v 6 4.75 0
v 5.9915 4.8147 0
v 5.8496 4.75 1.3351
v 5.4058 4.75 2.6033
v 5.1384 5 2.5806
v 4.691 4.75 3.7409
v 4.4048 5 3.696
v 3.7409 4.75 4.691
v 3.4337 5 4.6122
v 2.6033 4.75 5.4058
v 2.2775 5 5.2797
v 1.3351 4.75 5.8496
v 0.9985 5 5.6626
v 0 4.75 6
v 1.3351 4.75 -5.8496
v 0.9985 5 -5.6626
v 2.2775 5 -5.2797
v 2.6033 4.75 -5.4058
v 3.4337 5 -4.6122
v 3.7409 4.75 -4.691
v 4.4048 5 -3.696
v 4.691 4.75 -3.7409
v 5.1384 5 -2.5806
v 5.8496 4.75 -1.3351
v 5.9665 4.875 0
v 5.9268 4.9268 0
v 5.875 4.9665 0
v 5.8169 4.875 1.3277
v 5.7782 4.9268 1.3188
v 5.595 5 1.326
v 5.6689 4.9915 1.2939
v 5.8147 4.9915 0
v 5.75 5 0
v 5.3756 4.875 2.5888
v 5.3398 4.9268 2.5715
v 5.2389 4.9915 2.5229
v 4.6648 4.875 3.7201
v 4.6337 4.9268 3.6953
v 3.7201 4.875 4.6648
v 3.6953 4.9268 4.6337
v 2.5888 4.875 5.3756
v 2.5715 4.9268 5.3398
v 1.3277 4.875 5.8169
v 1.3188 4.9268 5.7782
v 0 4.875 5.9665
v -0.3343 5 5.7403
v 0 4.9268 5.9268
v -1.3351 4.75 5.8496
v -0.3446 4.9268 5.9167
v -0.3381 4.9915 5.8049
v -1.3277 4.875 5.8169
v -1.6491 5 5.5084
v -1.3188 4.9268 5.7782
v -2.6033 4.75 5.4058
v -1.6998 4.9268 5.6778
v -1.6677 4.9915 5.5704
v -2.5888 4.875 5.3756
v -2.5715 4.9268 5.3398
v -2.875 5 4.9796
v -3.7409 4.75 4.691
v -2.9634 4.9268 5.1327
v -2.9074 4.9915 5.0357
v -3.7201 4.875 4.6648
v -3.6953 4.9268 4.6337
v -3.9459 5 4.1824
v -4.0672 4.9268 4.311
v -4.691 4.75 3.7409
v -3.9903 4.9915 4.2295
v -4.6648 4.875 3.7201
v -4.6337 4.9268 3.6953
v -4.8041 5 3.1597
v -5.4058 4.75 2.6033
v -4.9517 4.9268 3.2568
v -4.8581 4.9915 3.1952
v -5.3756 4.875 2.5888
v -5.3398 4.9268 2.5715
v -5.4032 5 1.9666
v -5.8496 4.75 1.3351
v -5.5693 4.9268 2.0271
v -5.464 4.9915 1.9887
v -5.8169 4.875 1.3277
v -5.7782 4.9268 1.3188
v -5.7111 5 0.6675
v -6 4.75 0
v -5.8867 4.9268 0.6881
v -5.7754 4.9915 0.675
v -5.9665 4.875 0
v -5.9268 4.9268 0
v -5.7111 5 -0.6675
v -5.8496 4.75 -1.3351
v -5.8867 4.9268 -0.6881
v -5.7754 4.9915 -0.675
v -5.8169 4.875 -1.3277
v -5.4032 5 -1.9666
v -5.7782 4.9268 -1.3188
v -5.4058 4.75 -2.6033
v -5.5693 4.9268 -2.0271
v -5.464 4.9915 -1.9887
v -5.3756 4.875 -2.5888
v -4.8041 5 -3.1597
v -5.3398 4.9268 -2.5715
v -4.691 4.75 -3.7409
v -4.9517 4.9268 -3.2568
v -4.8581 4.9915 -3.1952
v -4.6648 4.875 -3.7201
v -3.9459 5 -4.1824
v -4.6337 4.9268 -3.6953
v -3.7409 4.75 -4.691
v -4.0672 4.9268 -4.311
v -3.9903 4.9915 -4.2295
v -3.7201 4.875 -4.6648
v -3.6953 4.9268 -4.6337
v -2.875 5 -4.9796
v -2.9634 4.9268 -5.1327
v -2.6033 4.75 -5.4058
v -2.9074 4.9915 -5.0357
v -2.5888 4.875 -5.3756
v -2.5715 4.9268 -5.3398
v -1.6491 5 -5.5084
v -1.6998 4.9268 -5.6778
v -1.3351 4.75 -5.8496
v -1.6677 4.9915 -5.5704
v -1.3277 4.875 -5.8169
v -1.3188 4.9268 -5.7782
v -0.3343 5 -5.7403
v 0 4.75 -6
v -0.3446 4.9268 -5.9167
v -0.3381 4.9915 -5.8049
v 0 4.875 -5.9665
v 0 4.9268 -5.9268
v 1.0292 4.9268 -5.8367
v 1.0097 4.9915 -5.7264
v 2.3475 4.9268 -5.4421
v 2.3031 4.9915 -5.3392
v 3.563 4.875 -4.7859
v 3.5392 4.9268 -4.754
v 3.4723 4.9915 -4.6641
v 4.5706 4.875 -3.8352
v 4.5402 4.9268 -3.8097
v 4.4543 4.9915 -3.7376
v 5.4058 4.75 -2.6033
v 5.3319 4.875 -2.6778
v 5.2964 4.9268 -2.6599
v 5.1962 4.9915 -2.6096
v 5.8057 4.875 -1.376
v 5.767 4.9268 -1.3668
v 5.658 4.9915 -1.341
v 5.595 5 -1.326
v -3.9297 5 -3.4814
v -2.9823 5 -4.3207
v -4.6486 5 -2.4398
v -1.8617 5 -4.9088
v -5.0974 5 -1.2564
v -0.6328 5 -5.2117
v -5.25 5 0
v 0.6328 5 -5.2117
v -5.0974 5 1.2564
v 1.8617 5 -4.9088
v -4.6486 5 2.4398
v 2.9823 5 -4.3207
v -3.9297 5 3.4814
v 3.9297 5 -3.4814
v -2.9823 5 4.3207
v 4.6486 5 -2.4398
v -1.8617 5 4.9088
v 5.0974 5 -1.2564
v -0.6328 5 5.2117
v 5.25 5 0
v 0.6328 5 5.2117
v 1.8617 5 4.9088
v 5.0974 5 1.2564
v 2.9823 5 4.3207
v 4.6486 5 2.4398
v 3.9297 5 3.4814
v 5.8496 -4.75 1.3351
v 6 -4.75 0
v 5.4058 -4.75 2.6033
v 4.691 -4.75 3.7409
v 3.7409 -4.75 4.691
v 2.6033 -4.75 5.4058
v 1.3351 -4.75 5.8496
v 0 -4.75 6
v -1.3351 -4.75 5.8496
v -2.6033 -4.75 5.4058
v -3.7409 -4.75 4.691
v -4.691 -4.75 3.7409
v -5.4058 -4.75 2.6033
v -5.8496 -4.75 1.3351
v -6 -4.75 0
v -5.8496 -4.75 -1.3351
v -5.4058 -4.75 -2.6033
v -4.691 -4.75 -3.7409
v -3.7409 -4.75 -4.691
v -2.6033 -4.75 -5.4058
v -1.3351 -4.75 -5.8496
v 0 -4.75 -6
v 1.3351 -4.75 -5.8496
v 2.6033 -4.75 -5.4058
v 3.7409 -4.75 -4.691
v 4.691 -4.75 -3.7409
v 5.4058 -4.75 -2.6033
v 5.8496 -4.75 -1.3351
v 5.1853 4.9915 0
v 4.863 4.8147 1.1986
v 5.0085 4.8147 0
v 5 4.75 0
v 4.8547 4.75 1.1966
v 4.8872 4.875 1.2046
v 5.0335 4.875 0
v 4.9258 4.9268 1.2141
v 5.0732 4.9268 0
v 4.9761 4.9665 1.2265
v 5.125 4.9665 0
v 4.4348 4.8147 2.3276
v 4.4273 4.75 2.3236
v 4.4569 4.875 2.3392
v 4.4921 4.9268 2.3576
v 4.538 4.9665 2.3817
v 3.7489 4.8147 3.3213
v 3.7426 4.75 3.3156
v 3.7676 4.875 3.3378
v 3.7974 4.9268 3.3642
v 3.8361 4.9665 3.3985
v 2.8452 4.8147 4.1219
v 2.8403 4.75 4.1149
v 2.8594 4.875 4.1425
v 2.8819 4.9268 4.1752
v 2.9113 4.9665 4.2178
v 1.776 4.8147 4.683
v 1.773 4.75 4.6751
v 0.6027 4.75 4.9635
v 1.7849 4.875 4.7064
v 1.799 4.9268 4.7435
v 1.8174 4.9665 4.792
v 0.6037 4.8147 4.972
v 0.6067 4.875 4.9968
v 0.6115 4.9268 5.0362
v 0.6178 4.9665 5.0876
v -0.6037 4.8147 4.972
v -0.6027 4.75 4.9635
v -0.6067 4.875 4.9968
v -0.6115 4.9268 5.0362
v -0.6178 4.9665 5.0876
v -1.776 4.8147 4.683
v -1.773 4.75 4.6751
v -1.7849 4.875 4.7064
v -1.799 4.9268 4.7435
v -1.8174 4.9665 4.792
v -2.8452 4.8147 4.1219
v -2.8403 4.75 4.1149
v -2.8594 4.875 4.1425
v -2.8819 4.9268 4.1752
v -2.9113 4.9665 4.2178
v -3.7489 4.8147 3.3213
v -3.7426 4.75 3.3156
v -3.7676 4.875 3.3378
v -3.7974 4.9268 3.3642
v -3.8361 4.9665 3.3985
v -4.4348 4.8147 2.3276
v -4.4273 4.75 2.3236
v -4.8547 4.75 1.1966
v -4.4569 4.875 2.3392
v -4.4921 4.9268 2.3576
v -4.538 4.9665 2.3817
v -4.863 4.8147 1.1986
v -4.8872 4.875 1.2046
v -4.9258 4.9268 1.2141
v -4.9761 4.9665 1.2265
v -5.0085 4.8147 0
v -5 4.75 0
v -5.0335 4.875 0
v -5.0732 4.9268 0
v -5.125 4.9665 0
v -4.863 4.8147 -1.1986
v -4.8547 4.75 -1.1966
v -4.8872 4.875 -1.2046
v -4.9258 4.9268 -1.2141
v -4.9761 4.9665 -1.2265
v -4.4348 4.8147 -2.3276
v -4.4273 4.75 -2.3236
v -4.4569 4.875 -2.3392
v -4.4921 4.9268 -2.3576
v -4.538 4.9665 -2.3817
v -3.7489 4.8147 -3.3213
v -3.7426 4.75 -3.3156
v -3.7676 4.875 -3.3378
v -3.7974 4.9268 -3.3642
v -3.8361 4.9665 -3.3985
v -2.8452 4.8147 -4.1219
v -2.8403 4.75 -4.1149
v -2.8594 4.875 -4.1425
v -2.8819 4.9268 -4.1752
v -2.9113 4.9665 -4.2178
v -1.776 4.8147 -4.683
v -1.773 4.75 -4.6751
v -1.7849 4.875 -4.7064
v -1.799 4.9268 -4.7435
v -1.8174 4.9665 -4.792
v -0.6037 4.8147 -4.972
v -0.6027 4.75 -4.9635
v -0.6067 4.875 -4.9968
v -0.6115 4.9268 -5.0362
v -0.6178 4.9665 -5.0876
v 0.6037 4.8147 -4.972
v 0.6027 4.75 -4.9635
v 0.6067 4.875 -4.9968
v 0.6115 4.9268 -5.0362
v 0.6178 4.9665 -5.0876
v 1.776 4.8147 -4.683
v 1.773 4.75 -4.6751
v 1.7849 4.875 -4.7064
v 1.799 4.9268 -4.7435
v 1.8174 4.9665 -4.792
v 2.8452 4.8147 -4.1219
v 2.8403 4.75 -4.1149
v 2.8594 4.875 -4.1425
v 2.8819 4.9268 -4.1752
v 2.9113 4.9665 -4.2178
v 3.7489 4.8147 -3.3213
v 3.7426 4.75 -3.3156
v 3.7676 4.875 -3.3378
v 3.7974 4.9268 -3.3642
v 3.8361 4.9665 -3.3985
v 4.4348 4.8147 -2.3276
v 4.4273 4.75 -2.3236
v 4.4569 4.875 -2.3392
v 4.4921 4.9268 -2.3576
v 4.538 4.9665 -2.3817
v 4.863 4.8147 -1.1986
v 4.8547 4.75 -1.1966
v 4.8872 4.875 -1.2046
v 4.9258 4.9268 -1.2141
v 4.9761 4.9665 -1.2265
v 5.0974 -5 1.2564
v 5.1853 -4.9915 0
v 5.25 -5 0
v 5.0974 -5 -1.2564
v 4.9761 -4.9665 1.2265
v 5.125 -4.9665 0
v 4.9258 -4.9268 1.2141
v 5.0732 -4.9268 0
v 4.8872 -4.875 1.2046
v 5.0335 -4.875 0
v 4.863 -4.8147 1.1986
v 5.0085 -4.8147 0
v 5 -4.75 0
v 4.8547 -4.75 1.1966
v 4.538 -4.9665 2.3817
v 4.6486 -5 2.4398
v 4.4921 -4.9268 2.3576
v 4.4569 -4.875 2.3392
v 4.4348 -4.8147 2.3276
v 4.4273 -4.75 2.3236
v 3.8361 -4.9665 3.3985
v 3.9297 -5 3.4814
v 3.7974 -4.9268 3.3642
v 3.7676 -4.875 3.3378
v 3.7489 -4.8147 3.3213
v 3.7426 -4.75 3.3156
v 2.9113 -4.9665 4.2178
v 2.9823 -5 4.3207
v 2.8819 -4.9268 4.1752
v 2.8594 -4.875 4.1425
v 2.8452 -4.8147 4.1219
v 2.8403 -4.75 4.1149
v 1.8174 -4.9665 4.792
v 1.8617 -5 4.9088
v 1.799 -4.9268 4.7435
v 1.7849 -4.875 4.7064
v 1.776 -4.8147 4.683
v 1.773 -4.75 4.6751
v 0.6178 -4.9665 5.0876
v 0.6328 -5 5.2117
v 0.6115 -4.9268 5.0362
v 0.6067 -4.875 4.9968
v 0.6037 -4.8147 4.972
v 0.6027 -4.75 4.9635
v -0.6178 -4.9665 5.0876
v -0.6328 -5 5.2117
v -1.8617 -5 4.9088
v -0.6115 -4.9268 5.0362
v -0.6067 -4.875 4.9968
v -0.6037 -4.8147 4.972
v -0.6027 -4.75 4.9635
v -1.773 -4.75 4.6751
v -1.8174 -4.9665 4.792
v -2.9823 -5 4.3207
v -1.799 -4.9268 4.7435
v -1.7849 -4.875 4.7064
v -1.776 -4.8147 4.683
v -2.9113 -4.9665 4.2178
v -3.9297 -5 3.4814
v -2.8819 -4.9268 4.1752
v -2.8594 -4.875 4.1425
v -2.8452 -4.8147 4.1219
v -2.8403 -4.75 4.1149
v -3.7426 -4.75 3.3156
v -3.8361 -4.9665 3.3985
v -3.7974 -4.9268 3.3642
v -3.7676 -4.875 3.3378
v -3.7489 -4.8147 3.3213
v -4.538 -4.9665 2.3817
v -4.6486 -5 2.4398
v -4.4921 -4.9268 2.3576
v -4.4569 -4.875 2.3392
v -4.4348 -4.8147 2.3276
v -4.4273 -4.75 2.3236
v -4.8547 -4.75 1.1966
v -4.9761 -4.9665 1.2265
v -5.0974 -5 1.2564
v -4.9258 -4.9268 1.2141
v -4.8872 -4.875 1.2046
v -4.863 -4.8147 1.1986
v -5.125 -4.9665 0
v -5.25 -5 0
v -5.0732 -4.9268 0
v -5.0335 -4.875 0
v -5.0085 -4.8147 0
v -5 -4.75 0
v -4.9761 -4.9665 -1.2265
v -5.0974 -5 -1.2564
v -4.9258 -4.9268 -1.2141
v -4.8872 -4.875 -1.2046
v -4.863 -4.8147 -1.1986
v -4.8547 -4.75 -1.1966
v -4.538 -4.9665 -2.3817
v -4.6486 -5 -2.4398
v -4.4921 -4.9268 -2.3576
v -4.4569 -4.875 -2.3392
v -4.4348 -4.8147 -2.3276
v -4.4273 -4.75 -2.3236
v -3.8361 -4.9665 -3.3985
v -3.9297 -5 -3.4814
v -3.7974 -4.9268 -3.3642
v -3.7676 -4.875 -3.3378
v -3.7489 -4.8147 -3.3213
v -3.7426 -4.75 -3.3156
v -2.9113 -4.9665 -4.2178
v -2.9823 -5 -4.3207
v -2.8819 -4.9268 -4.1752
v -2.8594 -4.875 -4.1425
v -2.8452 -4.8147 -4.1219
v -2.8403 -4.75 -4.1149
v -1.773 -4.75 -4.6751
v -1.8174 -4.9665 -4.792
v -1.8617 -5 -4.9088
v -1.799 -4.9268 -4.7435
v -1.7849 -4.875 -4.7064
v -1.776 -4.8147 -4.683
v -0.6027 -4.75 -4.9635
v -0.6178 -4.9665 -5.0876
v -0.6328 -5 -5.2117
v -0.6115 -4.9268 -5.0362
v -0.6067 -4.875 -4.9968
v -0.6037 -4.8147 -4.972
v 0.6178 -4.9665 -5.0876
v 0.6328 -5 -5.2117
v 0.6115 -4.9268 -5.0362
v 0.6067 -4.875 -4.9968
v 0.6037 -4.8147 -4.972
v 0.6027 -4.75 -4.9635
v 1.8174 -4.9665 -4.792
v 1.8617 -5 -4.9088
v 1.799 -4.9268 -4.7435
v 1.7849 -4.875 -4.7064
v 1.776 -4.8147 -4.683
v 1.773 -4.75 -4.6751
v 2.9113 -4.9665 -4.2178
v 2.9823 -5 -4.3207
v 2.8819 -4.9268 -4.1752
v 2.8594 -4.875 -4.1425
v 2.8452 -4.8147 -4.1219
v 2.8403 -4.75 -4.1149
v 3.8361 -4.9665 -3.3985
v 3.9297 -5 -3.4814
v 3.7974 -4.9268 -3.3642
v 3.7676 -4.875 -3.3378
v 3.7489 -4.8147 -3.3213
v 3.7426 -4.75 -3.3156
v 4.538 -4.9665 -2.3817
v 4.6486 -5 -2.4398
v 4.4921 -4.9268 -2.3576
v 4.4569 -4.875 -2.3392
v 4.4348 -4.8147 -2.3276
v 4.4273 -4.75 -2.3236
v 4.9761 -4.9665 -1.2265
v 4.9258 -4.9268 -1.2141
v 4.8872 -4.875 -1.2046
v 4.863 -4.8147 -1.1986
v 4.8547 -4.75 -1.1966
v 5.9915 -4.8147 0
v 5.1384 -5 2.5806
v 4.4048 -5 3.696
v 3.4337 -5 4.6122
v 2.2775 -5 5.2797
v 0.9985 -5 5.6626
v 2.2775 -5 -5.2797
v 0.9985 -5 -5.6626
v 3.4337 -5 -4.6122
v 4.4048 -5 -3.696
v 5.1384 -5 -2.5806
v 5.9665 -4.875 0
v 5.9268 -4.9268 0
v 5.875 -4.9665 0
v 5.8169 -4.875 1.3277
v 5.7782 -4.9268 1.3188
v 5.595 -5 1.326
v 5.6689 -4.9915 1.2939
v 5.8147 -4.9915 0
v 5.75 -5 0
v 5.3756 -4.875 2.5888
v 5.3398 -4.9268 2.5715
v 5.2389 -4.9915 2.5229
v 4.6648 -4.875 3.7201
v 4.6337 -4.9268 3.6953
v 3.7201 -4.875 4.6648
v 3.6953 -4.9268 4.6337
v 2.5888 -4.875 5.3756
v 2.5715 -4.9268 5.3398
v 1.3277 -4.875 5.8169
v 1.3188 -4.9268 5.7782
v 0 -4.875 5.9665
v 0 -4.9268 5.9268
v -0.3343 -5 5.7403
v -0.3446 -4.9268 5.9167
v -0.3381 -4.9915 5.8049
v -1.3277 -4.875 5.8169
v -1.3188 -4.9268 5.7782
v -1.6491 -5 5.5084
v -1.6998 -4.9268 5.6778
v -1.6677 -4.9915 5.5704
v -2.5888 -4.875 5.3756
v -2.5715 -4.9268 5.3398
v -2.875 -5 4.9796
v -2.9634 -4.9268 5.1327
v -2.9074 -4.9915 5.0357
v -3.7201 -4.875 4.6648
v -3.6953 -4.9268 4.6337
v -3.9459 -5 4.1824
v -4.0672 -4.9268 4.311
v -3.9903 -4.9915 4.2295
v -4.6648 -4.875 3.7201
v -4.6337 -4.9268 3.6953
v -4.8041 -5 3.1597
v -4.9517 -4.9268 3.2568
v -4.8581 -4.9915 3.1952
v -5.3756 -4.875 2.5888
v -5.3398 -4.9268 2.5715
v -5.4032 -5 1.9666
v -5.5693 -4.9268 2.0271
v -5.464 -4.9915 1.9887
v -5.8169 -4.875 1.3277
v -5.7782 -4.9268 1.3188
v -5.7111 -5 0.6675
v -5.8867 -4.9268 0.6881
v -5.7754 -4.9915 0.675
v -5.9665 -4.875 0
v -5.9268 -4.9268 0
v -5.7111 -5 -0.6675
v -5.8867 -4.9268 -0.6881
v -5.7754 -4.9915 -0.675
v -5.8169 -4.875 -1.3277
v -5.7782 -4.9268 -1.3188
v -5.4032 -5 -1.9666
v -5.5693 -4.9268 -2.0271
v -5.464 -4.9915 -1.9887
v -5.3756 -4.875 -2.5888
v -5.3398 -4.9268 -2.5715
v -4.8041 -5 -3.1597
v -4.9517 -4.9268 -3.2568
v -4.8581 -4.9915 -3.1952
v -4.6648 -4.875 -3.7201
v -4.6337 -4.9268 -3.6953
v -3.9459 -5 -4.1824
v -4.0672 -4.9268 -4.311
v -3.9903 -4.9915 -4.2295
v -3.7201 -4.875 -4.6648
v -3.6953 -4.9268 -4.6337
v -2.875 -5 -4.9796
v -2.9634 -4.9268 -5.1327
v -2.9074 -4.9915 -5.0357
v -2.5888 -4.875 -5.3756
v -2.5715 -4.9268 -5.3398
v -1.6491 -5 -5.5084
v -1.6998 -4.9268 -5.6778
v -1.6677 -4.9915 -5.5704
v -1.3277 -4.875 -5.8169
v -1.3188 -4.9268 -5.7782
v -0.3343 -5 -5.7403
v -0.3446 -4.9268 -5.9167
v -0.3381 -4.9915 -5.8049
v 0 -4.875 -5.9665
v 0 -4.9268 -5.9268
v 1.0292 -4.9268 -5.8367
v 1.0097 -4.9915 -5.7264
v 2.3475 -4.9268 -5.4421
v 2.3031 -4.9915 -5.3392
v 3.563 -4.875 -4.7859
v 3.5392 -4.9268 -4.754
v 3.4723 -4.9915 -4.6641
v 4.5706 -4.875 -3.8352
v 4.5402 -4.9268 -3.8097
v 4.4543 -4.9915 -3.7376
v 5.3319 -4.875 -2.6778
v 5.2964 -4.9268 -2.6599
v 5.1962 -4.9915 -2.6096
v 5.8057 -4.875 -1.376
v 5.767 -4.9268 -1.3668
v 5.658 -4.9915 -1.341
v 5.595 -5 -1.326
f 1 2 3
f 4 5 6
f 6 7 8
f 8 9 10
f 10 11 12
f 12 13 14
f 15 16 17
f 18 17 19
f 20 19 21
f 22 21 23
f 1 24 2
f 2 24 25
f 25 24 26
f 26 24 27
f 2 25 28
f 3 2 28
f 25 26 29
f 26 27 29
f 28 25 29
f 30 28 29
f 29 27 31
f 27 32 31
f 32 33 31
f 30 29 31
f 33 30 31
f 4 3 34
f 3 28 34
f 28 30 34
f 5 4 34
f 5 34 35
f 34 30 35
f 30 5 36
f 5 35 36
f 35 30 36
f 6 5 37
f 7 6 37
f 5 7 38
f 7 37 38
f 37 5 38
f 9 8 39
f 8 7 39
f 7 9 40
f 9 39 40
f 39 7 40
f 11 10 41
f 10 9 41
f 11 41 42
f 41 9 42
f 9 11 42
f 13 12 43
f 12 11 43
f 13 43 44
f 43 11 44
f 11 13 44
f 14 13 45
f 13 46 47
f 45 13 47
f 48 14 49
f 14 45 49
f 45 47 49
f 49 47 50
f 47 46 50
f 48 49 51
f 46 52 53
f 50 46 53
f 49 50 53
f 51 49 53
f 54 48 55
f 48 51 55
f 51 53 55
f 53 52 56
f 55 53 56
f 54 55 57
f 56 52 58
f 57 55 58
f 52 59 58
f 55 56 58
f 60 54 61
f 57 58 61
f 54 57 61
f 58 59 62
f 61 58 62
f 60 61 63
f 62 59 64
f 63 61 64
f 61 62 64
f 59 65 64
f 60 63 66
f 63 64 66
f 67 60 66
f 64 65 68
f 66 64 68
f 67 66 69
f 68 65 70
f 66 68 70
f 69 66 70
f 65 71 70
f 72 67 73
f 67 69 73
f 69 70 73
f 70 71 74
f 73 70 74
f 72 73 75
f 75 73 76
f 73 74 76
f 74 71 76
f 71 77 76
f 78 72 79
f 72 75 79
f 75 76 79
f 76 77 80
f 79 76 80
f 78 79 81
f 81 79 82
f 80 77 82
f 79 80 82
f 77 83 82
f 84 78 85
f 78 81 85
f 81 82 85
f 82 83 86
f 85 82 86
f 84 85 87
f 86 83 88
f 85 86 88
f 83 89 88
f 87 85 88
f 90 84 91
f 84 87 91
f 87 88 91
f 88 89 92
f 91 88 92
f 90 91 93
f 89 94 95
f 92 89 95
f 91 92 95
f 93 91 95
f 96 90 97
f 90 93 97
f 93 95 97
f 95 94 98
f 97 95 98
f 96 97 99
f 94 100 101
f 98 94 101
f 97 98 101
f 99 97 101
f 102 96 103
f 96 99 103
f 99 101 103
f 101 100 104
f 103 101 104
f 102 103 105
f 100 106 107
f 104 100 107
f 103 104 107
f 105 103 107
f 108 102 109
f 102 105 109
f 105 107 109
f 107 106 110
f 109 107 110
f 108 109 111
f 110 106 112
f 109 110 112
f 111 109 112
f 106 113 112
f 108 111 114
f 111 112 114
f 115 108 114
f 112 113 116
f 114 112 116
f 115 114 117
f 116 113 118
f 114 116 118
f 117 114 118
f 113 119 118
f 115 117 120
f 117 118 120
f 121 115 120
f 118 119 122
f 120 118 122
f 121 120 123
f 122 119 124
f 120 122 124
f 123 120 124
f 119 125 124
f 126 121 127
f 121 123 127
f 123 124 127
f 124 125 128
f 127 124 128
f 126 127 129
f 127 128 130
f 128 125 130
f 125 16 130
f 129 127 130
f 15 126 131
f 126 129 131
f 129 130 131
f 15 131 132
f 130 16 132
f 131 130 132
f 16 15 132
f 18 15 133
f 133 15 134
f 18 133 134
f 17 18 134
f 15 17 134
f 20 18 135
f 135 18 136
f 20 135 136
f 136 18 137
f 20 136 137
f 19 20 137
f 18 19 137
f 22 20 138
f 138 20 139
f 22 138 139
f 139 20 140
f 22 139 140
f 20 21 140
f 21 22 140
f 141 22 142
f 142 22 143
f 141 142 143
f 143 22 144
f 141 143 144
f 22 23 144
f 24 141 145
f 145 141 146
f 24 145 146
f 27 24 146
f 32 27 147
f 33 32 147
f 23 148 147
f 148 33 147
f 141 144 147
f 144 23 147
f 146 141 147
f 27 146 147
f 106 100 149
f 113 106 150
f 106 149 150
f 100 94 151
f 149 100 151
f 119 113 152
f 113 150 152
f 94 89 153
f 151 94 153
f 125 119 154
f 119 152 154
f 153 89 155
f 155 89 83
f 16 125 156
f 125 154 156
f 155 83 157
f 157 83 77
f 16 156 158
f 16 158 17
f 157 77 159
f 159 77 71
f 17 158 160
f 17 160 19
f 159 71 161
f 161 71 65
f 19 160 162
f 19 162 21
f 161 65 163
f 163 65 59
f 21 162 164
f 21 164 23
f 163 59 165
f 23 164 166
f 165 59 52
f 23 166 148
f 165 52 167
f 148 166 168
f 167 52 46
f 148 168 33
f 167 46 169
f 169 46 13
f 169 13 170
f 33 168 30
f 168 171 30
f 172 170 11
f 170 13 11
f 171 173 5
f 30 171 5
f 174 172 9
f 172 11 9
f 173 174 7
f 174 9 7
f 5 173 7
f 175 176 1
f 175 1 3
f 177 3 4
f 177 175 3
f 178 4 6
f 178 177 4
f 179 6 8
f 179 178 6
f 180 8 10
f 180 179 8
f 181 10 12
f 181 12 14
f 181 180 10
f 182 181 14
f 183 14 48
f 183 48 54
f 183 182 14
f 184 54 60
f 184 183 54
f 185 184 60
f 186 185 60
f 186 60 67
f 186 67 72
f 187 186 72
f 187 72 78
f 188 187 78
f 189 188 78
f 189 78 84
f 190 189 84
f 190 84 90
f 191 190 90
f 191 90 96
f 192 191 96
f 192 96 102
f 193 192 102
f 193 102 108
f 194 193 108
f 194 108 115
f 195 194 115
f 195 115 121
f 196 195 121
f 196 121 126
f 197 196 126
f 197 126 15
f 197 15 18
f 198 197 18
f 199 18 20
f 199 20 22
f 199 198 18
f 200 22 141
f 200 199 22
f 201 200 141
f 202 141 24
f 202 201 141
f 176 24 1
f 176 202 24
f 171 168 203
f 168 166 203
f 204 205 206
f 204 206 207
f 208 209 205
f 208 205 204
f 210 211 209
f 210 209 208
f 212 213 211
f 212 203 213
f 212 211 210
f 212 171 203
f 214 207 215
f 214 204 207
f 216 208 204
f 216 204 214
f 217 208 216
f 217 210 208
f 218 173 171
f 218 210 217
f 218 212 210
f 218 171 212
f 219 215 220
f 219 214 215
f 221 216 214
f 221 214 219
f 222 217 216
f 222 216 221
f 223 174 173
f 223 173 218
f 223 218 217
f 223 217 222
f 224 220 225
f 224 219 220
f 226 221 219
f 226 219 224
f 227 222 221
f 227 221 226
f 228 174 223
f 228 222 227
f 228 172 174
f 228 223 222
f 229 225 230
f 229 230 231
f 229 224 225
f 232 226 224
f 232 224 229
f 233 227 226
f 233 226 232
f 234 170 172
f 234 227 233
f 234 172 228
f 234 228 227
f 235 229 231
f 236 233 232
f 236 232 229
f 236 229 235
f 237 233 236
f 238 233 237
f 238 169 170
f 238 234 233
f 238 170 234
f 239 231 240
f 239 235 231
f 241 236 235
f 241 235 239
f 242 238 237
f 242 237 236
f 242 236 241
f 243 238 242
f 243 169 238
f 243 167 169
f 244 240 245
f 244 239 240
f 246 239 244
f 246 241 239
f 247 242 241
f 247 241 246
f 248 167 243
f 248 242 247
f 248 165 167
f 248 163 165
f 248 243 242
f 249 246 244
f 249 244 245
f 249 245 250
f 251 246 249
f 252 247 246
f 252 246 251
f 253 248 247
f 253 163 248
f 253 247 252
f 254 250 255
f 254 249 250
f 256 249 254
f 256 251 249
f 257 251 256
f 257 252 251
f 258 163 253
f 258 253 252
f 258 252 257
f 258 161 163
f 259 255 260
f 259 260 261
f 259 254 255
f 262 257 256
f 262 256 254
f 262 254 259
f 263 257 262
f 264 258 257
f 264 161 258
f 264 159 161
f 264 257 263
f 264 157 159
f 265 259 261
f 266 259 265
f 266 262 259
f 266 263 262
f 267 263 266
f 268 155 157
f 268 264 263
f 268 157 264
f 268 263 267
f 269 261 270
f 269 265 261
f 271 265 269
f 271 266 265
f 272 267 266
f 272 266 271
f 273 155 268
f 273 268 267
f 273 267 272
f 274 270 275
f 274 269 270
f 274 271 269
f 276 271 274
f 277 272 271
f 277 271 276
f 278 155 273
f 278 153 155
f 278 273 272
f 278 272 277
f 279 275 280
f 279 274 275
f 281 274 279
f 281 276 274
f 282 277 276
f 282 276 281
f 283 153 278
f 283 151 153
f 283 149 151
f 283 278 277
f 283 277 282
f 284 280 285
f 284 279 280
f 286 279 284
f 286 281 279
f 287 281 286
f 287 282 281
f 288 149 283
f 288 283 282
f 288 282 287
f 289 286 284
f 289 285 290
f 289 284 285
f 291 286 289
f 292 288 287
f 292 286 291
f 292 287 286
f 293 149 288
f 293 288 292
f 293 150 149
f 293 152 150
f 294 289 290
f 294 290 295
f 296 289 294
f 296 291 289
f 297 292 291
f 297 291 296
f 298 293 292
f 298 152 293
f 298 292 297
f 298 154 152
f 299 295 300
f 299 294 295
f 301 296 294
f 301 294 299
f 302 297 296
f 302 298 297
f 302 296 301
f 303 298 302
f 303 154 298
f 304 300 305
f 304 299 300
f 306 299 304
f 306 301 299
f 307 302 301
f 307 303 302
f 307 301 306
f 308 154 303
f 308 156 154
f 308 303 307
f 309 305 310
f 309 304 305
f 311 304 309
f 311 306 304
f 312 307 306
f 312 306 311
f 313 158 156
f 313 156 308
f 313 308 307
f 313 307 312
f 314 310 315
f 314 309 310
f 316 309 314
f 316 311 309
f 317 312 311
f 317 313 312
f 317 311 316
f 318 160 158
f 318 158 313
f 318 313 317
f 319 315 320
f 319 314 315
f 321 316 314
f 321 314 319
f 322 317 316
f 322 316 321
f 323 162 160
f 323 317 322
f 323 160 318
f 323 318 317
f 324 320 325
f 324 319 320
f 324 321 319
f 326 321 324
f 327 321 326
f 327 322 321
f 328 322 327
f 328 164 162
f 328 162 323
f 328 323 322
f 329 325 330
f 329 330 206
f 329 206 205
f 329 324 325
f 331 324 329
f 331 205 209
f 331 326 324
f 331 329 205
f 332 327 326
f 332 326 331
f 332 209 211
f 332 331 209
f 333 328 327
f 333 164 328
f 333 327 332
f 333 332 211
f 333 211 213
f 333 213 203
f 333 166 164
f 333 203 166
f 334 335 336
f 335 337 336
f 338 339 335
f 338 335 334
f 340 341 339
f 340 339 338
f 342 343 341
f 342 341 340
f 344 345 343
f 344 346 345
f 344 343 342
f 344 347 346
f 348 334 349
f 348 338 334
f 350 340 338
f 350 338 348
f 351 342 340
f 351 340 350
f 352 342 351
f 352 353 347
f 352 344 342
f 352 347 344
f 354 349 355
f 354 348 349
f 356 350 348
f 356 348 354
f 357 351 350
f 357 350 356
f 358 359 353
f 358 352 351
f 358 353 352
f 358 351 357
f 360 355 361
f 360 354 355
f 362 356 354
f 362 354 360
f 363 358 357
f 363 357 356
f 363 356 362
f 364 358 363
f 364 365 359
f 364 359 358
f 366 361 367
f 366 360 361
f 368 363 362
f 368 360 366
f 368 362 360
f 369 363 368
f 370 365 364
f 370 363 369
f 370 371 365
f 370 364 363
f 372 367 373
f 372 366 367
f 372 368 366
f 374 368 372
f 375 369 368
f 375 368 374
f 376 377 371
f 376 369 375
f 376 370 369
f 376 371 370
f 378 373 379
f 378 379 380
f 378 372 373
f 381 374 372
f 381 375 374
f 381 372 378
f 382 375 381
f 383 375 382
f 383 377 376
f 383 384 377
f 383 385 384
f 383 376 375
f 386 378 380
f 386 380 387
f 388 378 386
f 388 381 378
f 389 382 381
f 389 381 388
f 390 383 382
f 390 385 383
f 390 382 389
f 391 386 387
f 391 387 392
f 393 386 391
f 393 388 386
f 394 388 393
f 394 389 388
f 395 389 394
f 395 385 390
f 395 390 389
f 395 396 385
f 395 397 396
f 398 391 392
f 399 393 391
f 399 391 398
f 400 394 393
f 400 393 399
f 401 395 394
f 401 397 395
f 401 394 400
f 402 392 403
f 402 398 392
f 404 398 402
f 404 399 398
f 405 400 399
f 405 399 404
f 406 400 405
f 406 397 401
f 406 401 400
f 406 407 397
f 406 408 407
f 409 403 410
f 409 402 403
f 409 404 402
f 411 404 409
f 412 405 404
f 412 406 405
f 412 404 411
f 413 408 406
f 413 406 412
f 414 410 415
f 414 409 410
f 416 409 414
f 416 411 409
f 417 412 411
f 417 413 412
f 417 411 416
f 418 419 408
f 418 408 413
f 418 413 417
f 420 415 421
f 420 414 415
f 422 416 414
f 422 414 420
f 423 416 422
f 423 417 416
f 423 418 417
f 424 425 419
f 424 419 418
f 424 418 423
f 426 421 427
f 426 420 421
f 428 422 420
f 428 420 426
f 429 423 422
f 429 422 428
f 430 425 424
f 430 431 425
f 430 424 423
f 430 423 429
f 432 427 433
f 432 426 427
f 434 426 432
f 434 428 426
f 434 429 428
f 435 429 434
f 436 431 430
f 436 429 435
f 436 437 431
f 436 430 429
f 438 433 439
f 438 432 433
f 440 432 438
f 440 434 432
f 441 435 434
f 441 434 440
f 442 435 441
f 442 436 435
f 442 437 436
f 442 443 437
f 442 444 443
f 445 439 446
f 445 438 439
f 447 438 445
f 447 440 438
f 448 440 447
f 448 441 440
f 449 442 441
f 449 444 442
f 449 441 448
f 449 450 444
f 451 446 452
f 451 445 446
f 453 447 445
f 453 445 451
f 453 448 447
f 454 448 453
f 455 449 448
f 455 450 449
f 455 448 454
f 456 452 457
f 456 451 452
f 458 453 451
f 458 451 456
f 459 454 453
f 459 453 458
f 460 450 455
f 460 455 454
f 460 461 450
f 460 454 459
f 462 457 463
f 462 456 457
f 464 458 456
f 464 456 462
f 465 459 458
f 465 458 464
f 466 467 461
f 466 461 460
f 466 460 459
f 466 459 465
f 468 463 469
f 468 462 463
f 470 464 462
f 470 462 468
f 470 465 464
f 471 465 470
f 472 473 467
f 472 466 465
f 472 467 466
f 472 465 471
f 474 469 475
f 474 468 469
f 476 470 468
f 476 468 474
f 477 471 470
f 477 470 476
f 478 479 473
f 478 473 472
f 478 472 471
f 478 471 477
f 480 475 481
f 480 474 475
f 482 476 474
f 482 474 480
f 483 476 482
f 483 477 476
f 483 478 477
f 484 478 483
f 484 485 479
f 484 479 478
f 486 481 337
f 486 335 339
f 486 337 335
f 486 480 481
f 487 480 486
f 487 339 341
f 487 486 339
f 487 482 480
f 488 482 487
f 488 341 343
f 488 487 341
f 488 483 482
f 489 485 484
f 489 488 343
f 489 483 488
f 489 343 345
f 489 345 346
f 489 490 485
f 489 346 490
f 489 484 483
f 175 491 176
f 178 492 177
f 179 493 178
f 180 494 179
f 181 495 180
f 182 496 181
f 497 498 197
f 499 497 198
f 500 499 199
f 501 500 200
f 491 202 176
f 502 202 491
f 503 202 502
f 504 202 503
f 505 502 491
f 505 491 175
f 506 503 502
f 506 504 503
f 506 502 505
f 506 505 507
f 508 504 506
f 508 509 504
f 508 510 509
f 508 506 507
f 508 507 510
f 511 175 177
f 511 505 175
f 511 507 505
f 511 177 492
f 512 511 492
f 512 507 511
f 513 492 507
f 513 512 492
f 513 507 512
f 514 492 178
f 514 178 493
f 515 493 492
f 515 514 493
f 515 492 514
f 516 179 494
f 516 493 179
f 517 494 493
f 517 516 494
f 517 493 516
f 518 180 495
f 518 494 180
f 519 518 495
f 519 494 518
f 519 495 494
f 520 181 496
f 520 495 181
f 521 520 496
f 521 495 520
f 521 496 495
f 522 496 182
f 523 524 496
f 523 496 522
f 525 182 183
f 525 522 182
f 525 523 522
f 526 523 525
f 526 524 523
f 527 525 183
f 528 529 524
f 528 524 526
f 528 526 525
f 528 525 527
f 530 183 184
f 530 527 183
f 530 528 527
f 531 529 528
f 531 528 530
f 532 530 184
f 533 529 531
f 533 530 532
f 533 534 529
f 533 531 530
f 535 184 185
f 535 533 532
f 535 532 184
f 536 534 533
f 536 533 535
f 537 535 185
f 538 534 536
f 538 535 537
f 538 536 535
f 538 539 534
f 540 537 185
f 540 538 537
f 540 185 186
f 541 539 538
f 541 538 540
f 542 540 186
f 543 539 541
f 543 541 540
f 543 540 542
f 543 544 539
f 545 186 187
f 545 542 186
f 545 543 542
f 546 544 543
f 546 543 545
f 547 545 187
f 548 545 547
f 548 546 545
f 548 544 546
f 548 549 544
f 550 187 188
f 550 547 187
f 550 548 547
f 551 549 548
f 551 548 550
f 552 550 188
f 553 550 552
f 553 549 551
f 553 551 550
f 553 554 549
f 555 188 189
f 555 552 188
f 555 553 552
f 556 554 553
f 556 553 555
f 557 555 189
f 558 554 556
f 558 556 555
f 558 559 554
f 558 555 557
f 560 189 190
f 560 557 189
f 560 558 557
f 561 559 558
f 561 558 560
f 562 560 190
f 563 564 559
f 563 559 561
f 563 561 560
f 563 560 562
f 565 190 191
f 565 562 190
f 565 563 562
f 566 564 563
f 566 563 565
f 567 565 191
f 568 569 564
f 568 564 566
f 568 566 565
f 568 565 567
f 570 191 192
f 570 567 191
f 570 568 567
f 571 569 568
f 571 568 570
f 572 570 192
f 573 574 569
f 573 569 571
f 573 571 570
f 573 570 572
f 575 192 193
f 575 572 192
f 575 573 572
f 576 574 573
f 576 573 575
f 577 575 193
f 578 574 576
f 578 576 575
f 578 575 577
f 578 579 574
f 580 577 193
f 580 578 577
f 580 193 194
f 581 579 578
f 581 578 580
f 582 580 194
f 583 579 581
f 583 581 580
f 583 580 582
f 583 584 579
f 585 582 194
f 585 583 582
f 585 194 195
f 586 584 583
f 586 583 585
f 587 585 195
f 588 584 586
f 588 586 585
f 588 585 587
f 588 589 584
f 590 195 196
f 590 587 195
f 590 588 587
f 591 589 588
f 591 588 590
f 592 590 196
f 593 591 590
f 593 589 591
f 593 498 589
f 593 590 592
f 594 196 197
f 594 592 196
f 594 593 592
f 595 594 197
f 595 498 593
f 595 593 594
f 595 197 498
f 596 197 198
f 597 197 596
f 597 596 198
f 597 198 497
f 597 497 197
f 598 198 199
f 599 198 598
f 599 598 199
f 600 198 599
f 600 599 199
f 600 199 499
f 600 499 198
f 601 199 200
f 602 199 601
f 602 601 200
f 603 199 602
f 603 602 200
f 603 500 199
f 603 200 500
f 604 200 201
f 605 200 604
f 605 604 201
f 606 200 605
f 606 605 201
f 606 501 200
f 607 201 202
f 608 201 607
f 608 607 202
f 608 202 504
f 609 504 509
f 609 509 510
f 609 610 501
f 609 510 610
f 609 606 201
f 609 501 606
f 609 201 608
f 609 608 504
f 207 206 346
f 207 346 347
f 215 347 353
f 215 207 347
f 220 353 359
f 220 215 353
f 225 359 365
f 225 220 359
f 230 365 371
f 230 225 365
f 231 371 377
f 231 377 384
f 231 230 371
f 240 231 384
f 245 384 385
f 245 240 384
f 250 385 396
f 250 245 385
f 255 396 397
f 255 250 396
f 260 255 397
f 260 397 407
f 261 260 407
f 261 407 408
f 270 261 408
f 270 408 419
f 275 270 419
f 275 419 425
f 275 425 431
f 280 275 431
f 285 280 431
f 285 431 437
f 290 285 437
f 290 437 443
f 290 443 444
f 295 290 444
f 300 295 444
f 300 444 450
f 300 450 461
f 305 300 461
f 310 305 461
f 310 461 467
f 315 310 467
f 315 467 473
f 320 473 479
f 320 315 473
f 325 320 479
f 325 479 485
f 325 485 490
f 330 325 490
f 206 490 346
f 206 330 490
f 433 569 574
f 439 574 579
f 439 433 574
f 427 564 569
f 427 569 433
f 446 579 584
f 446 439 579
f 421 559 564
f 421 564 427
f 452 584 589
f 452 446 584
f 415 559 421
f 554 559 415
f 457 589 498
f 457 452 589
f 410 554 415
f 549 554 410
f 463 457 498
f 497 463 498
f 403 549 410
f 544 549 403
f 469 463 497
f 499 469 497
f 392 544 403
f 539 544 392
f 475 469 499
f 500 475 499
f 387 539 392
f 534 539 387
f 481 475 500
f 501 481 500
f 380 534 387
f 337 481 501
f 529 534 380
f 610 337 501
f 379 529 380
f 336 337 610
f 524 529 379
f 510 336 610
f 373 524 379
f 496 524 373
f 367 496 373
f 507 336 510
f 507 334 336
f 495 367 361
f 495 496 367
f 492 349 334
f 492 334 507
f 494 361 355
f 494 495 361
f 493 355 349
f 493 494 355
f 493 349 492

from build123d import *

# Parameters (mm, degrees)
F0_R     = 6
F0_R_2   = 5
F1_DEPTH = 5
F2_R     = 0.25


with BuildPart() as f1:
    # F0 (on Front) → F1 (new body, symmetric)
    with BuildSketch(Plane.XZ):
        Circle(F0_R)
        Circle(F0_R_2, mode=Mode.SUBTRACT)
    extrude(amount=F1_DEPTH, both=True)

    # F2
    f2_edges = [f1.edges().sort_by_distance(p)[0] for p in [
        (-6, -5, 0),
        (-5, -5, 0),
        (-6, 5, 0),
        (-5, 5, 0),
    ]]
    fillet(f2_edges, radius=F2_R)


solid = f1.part
